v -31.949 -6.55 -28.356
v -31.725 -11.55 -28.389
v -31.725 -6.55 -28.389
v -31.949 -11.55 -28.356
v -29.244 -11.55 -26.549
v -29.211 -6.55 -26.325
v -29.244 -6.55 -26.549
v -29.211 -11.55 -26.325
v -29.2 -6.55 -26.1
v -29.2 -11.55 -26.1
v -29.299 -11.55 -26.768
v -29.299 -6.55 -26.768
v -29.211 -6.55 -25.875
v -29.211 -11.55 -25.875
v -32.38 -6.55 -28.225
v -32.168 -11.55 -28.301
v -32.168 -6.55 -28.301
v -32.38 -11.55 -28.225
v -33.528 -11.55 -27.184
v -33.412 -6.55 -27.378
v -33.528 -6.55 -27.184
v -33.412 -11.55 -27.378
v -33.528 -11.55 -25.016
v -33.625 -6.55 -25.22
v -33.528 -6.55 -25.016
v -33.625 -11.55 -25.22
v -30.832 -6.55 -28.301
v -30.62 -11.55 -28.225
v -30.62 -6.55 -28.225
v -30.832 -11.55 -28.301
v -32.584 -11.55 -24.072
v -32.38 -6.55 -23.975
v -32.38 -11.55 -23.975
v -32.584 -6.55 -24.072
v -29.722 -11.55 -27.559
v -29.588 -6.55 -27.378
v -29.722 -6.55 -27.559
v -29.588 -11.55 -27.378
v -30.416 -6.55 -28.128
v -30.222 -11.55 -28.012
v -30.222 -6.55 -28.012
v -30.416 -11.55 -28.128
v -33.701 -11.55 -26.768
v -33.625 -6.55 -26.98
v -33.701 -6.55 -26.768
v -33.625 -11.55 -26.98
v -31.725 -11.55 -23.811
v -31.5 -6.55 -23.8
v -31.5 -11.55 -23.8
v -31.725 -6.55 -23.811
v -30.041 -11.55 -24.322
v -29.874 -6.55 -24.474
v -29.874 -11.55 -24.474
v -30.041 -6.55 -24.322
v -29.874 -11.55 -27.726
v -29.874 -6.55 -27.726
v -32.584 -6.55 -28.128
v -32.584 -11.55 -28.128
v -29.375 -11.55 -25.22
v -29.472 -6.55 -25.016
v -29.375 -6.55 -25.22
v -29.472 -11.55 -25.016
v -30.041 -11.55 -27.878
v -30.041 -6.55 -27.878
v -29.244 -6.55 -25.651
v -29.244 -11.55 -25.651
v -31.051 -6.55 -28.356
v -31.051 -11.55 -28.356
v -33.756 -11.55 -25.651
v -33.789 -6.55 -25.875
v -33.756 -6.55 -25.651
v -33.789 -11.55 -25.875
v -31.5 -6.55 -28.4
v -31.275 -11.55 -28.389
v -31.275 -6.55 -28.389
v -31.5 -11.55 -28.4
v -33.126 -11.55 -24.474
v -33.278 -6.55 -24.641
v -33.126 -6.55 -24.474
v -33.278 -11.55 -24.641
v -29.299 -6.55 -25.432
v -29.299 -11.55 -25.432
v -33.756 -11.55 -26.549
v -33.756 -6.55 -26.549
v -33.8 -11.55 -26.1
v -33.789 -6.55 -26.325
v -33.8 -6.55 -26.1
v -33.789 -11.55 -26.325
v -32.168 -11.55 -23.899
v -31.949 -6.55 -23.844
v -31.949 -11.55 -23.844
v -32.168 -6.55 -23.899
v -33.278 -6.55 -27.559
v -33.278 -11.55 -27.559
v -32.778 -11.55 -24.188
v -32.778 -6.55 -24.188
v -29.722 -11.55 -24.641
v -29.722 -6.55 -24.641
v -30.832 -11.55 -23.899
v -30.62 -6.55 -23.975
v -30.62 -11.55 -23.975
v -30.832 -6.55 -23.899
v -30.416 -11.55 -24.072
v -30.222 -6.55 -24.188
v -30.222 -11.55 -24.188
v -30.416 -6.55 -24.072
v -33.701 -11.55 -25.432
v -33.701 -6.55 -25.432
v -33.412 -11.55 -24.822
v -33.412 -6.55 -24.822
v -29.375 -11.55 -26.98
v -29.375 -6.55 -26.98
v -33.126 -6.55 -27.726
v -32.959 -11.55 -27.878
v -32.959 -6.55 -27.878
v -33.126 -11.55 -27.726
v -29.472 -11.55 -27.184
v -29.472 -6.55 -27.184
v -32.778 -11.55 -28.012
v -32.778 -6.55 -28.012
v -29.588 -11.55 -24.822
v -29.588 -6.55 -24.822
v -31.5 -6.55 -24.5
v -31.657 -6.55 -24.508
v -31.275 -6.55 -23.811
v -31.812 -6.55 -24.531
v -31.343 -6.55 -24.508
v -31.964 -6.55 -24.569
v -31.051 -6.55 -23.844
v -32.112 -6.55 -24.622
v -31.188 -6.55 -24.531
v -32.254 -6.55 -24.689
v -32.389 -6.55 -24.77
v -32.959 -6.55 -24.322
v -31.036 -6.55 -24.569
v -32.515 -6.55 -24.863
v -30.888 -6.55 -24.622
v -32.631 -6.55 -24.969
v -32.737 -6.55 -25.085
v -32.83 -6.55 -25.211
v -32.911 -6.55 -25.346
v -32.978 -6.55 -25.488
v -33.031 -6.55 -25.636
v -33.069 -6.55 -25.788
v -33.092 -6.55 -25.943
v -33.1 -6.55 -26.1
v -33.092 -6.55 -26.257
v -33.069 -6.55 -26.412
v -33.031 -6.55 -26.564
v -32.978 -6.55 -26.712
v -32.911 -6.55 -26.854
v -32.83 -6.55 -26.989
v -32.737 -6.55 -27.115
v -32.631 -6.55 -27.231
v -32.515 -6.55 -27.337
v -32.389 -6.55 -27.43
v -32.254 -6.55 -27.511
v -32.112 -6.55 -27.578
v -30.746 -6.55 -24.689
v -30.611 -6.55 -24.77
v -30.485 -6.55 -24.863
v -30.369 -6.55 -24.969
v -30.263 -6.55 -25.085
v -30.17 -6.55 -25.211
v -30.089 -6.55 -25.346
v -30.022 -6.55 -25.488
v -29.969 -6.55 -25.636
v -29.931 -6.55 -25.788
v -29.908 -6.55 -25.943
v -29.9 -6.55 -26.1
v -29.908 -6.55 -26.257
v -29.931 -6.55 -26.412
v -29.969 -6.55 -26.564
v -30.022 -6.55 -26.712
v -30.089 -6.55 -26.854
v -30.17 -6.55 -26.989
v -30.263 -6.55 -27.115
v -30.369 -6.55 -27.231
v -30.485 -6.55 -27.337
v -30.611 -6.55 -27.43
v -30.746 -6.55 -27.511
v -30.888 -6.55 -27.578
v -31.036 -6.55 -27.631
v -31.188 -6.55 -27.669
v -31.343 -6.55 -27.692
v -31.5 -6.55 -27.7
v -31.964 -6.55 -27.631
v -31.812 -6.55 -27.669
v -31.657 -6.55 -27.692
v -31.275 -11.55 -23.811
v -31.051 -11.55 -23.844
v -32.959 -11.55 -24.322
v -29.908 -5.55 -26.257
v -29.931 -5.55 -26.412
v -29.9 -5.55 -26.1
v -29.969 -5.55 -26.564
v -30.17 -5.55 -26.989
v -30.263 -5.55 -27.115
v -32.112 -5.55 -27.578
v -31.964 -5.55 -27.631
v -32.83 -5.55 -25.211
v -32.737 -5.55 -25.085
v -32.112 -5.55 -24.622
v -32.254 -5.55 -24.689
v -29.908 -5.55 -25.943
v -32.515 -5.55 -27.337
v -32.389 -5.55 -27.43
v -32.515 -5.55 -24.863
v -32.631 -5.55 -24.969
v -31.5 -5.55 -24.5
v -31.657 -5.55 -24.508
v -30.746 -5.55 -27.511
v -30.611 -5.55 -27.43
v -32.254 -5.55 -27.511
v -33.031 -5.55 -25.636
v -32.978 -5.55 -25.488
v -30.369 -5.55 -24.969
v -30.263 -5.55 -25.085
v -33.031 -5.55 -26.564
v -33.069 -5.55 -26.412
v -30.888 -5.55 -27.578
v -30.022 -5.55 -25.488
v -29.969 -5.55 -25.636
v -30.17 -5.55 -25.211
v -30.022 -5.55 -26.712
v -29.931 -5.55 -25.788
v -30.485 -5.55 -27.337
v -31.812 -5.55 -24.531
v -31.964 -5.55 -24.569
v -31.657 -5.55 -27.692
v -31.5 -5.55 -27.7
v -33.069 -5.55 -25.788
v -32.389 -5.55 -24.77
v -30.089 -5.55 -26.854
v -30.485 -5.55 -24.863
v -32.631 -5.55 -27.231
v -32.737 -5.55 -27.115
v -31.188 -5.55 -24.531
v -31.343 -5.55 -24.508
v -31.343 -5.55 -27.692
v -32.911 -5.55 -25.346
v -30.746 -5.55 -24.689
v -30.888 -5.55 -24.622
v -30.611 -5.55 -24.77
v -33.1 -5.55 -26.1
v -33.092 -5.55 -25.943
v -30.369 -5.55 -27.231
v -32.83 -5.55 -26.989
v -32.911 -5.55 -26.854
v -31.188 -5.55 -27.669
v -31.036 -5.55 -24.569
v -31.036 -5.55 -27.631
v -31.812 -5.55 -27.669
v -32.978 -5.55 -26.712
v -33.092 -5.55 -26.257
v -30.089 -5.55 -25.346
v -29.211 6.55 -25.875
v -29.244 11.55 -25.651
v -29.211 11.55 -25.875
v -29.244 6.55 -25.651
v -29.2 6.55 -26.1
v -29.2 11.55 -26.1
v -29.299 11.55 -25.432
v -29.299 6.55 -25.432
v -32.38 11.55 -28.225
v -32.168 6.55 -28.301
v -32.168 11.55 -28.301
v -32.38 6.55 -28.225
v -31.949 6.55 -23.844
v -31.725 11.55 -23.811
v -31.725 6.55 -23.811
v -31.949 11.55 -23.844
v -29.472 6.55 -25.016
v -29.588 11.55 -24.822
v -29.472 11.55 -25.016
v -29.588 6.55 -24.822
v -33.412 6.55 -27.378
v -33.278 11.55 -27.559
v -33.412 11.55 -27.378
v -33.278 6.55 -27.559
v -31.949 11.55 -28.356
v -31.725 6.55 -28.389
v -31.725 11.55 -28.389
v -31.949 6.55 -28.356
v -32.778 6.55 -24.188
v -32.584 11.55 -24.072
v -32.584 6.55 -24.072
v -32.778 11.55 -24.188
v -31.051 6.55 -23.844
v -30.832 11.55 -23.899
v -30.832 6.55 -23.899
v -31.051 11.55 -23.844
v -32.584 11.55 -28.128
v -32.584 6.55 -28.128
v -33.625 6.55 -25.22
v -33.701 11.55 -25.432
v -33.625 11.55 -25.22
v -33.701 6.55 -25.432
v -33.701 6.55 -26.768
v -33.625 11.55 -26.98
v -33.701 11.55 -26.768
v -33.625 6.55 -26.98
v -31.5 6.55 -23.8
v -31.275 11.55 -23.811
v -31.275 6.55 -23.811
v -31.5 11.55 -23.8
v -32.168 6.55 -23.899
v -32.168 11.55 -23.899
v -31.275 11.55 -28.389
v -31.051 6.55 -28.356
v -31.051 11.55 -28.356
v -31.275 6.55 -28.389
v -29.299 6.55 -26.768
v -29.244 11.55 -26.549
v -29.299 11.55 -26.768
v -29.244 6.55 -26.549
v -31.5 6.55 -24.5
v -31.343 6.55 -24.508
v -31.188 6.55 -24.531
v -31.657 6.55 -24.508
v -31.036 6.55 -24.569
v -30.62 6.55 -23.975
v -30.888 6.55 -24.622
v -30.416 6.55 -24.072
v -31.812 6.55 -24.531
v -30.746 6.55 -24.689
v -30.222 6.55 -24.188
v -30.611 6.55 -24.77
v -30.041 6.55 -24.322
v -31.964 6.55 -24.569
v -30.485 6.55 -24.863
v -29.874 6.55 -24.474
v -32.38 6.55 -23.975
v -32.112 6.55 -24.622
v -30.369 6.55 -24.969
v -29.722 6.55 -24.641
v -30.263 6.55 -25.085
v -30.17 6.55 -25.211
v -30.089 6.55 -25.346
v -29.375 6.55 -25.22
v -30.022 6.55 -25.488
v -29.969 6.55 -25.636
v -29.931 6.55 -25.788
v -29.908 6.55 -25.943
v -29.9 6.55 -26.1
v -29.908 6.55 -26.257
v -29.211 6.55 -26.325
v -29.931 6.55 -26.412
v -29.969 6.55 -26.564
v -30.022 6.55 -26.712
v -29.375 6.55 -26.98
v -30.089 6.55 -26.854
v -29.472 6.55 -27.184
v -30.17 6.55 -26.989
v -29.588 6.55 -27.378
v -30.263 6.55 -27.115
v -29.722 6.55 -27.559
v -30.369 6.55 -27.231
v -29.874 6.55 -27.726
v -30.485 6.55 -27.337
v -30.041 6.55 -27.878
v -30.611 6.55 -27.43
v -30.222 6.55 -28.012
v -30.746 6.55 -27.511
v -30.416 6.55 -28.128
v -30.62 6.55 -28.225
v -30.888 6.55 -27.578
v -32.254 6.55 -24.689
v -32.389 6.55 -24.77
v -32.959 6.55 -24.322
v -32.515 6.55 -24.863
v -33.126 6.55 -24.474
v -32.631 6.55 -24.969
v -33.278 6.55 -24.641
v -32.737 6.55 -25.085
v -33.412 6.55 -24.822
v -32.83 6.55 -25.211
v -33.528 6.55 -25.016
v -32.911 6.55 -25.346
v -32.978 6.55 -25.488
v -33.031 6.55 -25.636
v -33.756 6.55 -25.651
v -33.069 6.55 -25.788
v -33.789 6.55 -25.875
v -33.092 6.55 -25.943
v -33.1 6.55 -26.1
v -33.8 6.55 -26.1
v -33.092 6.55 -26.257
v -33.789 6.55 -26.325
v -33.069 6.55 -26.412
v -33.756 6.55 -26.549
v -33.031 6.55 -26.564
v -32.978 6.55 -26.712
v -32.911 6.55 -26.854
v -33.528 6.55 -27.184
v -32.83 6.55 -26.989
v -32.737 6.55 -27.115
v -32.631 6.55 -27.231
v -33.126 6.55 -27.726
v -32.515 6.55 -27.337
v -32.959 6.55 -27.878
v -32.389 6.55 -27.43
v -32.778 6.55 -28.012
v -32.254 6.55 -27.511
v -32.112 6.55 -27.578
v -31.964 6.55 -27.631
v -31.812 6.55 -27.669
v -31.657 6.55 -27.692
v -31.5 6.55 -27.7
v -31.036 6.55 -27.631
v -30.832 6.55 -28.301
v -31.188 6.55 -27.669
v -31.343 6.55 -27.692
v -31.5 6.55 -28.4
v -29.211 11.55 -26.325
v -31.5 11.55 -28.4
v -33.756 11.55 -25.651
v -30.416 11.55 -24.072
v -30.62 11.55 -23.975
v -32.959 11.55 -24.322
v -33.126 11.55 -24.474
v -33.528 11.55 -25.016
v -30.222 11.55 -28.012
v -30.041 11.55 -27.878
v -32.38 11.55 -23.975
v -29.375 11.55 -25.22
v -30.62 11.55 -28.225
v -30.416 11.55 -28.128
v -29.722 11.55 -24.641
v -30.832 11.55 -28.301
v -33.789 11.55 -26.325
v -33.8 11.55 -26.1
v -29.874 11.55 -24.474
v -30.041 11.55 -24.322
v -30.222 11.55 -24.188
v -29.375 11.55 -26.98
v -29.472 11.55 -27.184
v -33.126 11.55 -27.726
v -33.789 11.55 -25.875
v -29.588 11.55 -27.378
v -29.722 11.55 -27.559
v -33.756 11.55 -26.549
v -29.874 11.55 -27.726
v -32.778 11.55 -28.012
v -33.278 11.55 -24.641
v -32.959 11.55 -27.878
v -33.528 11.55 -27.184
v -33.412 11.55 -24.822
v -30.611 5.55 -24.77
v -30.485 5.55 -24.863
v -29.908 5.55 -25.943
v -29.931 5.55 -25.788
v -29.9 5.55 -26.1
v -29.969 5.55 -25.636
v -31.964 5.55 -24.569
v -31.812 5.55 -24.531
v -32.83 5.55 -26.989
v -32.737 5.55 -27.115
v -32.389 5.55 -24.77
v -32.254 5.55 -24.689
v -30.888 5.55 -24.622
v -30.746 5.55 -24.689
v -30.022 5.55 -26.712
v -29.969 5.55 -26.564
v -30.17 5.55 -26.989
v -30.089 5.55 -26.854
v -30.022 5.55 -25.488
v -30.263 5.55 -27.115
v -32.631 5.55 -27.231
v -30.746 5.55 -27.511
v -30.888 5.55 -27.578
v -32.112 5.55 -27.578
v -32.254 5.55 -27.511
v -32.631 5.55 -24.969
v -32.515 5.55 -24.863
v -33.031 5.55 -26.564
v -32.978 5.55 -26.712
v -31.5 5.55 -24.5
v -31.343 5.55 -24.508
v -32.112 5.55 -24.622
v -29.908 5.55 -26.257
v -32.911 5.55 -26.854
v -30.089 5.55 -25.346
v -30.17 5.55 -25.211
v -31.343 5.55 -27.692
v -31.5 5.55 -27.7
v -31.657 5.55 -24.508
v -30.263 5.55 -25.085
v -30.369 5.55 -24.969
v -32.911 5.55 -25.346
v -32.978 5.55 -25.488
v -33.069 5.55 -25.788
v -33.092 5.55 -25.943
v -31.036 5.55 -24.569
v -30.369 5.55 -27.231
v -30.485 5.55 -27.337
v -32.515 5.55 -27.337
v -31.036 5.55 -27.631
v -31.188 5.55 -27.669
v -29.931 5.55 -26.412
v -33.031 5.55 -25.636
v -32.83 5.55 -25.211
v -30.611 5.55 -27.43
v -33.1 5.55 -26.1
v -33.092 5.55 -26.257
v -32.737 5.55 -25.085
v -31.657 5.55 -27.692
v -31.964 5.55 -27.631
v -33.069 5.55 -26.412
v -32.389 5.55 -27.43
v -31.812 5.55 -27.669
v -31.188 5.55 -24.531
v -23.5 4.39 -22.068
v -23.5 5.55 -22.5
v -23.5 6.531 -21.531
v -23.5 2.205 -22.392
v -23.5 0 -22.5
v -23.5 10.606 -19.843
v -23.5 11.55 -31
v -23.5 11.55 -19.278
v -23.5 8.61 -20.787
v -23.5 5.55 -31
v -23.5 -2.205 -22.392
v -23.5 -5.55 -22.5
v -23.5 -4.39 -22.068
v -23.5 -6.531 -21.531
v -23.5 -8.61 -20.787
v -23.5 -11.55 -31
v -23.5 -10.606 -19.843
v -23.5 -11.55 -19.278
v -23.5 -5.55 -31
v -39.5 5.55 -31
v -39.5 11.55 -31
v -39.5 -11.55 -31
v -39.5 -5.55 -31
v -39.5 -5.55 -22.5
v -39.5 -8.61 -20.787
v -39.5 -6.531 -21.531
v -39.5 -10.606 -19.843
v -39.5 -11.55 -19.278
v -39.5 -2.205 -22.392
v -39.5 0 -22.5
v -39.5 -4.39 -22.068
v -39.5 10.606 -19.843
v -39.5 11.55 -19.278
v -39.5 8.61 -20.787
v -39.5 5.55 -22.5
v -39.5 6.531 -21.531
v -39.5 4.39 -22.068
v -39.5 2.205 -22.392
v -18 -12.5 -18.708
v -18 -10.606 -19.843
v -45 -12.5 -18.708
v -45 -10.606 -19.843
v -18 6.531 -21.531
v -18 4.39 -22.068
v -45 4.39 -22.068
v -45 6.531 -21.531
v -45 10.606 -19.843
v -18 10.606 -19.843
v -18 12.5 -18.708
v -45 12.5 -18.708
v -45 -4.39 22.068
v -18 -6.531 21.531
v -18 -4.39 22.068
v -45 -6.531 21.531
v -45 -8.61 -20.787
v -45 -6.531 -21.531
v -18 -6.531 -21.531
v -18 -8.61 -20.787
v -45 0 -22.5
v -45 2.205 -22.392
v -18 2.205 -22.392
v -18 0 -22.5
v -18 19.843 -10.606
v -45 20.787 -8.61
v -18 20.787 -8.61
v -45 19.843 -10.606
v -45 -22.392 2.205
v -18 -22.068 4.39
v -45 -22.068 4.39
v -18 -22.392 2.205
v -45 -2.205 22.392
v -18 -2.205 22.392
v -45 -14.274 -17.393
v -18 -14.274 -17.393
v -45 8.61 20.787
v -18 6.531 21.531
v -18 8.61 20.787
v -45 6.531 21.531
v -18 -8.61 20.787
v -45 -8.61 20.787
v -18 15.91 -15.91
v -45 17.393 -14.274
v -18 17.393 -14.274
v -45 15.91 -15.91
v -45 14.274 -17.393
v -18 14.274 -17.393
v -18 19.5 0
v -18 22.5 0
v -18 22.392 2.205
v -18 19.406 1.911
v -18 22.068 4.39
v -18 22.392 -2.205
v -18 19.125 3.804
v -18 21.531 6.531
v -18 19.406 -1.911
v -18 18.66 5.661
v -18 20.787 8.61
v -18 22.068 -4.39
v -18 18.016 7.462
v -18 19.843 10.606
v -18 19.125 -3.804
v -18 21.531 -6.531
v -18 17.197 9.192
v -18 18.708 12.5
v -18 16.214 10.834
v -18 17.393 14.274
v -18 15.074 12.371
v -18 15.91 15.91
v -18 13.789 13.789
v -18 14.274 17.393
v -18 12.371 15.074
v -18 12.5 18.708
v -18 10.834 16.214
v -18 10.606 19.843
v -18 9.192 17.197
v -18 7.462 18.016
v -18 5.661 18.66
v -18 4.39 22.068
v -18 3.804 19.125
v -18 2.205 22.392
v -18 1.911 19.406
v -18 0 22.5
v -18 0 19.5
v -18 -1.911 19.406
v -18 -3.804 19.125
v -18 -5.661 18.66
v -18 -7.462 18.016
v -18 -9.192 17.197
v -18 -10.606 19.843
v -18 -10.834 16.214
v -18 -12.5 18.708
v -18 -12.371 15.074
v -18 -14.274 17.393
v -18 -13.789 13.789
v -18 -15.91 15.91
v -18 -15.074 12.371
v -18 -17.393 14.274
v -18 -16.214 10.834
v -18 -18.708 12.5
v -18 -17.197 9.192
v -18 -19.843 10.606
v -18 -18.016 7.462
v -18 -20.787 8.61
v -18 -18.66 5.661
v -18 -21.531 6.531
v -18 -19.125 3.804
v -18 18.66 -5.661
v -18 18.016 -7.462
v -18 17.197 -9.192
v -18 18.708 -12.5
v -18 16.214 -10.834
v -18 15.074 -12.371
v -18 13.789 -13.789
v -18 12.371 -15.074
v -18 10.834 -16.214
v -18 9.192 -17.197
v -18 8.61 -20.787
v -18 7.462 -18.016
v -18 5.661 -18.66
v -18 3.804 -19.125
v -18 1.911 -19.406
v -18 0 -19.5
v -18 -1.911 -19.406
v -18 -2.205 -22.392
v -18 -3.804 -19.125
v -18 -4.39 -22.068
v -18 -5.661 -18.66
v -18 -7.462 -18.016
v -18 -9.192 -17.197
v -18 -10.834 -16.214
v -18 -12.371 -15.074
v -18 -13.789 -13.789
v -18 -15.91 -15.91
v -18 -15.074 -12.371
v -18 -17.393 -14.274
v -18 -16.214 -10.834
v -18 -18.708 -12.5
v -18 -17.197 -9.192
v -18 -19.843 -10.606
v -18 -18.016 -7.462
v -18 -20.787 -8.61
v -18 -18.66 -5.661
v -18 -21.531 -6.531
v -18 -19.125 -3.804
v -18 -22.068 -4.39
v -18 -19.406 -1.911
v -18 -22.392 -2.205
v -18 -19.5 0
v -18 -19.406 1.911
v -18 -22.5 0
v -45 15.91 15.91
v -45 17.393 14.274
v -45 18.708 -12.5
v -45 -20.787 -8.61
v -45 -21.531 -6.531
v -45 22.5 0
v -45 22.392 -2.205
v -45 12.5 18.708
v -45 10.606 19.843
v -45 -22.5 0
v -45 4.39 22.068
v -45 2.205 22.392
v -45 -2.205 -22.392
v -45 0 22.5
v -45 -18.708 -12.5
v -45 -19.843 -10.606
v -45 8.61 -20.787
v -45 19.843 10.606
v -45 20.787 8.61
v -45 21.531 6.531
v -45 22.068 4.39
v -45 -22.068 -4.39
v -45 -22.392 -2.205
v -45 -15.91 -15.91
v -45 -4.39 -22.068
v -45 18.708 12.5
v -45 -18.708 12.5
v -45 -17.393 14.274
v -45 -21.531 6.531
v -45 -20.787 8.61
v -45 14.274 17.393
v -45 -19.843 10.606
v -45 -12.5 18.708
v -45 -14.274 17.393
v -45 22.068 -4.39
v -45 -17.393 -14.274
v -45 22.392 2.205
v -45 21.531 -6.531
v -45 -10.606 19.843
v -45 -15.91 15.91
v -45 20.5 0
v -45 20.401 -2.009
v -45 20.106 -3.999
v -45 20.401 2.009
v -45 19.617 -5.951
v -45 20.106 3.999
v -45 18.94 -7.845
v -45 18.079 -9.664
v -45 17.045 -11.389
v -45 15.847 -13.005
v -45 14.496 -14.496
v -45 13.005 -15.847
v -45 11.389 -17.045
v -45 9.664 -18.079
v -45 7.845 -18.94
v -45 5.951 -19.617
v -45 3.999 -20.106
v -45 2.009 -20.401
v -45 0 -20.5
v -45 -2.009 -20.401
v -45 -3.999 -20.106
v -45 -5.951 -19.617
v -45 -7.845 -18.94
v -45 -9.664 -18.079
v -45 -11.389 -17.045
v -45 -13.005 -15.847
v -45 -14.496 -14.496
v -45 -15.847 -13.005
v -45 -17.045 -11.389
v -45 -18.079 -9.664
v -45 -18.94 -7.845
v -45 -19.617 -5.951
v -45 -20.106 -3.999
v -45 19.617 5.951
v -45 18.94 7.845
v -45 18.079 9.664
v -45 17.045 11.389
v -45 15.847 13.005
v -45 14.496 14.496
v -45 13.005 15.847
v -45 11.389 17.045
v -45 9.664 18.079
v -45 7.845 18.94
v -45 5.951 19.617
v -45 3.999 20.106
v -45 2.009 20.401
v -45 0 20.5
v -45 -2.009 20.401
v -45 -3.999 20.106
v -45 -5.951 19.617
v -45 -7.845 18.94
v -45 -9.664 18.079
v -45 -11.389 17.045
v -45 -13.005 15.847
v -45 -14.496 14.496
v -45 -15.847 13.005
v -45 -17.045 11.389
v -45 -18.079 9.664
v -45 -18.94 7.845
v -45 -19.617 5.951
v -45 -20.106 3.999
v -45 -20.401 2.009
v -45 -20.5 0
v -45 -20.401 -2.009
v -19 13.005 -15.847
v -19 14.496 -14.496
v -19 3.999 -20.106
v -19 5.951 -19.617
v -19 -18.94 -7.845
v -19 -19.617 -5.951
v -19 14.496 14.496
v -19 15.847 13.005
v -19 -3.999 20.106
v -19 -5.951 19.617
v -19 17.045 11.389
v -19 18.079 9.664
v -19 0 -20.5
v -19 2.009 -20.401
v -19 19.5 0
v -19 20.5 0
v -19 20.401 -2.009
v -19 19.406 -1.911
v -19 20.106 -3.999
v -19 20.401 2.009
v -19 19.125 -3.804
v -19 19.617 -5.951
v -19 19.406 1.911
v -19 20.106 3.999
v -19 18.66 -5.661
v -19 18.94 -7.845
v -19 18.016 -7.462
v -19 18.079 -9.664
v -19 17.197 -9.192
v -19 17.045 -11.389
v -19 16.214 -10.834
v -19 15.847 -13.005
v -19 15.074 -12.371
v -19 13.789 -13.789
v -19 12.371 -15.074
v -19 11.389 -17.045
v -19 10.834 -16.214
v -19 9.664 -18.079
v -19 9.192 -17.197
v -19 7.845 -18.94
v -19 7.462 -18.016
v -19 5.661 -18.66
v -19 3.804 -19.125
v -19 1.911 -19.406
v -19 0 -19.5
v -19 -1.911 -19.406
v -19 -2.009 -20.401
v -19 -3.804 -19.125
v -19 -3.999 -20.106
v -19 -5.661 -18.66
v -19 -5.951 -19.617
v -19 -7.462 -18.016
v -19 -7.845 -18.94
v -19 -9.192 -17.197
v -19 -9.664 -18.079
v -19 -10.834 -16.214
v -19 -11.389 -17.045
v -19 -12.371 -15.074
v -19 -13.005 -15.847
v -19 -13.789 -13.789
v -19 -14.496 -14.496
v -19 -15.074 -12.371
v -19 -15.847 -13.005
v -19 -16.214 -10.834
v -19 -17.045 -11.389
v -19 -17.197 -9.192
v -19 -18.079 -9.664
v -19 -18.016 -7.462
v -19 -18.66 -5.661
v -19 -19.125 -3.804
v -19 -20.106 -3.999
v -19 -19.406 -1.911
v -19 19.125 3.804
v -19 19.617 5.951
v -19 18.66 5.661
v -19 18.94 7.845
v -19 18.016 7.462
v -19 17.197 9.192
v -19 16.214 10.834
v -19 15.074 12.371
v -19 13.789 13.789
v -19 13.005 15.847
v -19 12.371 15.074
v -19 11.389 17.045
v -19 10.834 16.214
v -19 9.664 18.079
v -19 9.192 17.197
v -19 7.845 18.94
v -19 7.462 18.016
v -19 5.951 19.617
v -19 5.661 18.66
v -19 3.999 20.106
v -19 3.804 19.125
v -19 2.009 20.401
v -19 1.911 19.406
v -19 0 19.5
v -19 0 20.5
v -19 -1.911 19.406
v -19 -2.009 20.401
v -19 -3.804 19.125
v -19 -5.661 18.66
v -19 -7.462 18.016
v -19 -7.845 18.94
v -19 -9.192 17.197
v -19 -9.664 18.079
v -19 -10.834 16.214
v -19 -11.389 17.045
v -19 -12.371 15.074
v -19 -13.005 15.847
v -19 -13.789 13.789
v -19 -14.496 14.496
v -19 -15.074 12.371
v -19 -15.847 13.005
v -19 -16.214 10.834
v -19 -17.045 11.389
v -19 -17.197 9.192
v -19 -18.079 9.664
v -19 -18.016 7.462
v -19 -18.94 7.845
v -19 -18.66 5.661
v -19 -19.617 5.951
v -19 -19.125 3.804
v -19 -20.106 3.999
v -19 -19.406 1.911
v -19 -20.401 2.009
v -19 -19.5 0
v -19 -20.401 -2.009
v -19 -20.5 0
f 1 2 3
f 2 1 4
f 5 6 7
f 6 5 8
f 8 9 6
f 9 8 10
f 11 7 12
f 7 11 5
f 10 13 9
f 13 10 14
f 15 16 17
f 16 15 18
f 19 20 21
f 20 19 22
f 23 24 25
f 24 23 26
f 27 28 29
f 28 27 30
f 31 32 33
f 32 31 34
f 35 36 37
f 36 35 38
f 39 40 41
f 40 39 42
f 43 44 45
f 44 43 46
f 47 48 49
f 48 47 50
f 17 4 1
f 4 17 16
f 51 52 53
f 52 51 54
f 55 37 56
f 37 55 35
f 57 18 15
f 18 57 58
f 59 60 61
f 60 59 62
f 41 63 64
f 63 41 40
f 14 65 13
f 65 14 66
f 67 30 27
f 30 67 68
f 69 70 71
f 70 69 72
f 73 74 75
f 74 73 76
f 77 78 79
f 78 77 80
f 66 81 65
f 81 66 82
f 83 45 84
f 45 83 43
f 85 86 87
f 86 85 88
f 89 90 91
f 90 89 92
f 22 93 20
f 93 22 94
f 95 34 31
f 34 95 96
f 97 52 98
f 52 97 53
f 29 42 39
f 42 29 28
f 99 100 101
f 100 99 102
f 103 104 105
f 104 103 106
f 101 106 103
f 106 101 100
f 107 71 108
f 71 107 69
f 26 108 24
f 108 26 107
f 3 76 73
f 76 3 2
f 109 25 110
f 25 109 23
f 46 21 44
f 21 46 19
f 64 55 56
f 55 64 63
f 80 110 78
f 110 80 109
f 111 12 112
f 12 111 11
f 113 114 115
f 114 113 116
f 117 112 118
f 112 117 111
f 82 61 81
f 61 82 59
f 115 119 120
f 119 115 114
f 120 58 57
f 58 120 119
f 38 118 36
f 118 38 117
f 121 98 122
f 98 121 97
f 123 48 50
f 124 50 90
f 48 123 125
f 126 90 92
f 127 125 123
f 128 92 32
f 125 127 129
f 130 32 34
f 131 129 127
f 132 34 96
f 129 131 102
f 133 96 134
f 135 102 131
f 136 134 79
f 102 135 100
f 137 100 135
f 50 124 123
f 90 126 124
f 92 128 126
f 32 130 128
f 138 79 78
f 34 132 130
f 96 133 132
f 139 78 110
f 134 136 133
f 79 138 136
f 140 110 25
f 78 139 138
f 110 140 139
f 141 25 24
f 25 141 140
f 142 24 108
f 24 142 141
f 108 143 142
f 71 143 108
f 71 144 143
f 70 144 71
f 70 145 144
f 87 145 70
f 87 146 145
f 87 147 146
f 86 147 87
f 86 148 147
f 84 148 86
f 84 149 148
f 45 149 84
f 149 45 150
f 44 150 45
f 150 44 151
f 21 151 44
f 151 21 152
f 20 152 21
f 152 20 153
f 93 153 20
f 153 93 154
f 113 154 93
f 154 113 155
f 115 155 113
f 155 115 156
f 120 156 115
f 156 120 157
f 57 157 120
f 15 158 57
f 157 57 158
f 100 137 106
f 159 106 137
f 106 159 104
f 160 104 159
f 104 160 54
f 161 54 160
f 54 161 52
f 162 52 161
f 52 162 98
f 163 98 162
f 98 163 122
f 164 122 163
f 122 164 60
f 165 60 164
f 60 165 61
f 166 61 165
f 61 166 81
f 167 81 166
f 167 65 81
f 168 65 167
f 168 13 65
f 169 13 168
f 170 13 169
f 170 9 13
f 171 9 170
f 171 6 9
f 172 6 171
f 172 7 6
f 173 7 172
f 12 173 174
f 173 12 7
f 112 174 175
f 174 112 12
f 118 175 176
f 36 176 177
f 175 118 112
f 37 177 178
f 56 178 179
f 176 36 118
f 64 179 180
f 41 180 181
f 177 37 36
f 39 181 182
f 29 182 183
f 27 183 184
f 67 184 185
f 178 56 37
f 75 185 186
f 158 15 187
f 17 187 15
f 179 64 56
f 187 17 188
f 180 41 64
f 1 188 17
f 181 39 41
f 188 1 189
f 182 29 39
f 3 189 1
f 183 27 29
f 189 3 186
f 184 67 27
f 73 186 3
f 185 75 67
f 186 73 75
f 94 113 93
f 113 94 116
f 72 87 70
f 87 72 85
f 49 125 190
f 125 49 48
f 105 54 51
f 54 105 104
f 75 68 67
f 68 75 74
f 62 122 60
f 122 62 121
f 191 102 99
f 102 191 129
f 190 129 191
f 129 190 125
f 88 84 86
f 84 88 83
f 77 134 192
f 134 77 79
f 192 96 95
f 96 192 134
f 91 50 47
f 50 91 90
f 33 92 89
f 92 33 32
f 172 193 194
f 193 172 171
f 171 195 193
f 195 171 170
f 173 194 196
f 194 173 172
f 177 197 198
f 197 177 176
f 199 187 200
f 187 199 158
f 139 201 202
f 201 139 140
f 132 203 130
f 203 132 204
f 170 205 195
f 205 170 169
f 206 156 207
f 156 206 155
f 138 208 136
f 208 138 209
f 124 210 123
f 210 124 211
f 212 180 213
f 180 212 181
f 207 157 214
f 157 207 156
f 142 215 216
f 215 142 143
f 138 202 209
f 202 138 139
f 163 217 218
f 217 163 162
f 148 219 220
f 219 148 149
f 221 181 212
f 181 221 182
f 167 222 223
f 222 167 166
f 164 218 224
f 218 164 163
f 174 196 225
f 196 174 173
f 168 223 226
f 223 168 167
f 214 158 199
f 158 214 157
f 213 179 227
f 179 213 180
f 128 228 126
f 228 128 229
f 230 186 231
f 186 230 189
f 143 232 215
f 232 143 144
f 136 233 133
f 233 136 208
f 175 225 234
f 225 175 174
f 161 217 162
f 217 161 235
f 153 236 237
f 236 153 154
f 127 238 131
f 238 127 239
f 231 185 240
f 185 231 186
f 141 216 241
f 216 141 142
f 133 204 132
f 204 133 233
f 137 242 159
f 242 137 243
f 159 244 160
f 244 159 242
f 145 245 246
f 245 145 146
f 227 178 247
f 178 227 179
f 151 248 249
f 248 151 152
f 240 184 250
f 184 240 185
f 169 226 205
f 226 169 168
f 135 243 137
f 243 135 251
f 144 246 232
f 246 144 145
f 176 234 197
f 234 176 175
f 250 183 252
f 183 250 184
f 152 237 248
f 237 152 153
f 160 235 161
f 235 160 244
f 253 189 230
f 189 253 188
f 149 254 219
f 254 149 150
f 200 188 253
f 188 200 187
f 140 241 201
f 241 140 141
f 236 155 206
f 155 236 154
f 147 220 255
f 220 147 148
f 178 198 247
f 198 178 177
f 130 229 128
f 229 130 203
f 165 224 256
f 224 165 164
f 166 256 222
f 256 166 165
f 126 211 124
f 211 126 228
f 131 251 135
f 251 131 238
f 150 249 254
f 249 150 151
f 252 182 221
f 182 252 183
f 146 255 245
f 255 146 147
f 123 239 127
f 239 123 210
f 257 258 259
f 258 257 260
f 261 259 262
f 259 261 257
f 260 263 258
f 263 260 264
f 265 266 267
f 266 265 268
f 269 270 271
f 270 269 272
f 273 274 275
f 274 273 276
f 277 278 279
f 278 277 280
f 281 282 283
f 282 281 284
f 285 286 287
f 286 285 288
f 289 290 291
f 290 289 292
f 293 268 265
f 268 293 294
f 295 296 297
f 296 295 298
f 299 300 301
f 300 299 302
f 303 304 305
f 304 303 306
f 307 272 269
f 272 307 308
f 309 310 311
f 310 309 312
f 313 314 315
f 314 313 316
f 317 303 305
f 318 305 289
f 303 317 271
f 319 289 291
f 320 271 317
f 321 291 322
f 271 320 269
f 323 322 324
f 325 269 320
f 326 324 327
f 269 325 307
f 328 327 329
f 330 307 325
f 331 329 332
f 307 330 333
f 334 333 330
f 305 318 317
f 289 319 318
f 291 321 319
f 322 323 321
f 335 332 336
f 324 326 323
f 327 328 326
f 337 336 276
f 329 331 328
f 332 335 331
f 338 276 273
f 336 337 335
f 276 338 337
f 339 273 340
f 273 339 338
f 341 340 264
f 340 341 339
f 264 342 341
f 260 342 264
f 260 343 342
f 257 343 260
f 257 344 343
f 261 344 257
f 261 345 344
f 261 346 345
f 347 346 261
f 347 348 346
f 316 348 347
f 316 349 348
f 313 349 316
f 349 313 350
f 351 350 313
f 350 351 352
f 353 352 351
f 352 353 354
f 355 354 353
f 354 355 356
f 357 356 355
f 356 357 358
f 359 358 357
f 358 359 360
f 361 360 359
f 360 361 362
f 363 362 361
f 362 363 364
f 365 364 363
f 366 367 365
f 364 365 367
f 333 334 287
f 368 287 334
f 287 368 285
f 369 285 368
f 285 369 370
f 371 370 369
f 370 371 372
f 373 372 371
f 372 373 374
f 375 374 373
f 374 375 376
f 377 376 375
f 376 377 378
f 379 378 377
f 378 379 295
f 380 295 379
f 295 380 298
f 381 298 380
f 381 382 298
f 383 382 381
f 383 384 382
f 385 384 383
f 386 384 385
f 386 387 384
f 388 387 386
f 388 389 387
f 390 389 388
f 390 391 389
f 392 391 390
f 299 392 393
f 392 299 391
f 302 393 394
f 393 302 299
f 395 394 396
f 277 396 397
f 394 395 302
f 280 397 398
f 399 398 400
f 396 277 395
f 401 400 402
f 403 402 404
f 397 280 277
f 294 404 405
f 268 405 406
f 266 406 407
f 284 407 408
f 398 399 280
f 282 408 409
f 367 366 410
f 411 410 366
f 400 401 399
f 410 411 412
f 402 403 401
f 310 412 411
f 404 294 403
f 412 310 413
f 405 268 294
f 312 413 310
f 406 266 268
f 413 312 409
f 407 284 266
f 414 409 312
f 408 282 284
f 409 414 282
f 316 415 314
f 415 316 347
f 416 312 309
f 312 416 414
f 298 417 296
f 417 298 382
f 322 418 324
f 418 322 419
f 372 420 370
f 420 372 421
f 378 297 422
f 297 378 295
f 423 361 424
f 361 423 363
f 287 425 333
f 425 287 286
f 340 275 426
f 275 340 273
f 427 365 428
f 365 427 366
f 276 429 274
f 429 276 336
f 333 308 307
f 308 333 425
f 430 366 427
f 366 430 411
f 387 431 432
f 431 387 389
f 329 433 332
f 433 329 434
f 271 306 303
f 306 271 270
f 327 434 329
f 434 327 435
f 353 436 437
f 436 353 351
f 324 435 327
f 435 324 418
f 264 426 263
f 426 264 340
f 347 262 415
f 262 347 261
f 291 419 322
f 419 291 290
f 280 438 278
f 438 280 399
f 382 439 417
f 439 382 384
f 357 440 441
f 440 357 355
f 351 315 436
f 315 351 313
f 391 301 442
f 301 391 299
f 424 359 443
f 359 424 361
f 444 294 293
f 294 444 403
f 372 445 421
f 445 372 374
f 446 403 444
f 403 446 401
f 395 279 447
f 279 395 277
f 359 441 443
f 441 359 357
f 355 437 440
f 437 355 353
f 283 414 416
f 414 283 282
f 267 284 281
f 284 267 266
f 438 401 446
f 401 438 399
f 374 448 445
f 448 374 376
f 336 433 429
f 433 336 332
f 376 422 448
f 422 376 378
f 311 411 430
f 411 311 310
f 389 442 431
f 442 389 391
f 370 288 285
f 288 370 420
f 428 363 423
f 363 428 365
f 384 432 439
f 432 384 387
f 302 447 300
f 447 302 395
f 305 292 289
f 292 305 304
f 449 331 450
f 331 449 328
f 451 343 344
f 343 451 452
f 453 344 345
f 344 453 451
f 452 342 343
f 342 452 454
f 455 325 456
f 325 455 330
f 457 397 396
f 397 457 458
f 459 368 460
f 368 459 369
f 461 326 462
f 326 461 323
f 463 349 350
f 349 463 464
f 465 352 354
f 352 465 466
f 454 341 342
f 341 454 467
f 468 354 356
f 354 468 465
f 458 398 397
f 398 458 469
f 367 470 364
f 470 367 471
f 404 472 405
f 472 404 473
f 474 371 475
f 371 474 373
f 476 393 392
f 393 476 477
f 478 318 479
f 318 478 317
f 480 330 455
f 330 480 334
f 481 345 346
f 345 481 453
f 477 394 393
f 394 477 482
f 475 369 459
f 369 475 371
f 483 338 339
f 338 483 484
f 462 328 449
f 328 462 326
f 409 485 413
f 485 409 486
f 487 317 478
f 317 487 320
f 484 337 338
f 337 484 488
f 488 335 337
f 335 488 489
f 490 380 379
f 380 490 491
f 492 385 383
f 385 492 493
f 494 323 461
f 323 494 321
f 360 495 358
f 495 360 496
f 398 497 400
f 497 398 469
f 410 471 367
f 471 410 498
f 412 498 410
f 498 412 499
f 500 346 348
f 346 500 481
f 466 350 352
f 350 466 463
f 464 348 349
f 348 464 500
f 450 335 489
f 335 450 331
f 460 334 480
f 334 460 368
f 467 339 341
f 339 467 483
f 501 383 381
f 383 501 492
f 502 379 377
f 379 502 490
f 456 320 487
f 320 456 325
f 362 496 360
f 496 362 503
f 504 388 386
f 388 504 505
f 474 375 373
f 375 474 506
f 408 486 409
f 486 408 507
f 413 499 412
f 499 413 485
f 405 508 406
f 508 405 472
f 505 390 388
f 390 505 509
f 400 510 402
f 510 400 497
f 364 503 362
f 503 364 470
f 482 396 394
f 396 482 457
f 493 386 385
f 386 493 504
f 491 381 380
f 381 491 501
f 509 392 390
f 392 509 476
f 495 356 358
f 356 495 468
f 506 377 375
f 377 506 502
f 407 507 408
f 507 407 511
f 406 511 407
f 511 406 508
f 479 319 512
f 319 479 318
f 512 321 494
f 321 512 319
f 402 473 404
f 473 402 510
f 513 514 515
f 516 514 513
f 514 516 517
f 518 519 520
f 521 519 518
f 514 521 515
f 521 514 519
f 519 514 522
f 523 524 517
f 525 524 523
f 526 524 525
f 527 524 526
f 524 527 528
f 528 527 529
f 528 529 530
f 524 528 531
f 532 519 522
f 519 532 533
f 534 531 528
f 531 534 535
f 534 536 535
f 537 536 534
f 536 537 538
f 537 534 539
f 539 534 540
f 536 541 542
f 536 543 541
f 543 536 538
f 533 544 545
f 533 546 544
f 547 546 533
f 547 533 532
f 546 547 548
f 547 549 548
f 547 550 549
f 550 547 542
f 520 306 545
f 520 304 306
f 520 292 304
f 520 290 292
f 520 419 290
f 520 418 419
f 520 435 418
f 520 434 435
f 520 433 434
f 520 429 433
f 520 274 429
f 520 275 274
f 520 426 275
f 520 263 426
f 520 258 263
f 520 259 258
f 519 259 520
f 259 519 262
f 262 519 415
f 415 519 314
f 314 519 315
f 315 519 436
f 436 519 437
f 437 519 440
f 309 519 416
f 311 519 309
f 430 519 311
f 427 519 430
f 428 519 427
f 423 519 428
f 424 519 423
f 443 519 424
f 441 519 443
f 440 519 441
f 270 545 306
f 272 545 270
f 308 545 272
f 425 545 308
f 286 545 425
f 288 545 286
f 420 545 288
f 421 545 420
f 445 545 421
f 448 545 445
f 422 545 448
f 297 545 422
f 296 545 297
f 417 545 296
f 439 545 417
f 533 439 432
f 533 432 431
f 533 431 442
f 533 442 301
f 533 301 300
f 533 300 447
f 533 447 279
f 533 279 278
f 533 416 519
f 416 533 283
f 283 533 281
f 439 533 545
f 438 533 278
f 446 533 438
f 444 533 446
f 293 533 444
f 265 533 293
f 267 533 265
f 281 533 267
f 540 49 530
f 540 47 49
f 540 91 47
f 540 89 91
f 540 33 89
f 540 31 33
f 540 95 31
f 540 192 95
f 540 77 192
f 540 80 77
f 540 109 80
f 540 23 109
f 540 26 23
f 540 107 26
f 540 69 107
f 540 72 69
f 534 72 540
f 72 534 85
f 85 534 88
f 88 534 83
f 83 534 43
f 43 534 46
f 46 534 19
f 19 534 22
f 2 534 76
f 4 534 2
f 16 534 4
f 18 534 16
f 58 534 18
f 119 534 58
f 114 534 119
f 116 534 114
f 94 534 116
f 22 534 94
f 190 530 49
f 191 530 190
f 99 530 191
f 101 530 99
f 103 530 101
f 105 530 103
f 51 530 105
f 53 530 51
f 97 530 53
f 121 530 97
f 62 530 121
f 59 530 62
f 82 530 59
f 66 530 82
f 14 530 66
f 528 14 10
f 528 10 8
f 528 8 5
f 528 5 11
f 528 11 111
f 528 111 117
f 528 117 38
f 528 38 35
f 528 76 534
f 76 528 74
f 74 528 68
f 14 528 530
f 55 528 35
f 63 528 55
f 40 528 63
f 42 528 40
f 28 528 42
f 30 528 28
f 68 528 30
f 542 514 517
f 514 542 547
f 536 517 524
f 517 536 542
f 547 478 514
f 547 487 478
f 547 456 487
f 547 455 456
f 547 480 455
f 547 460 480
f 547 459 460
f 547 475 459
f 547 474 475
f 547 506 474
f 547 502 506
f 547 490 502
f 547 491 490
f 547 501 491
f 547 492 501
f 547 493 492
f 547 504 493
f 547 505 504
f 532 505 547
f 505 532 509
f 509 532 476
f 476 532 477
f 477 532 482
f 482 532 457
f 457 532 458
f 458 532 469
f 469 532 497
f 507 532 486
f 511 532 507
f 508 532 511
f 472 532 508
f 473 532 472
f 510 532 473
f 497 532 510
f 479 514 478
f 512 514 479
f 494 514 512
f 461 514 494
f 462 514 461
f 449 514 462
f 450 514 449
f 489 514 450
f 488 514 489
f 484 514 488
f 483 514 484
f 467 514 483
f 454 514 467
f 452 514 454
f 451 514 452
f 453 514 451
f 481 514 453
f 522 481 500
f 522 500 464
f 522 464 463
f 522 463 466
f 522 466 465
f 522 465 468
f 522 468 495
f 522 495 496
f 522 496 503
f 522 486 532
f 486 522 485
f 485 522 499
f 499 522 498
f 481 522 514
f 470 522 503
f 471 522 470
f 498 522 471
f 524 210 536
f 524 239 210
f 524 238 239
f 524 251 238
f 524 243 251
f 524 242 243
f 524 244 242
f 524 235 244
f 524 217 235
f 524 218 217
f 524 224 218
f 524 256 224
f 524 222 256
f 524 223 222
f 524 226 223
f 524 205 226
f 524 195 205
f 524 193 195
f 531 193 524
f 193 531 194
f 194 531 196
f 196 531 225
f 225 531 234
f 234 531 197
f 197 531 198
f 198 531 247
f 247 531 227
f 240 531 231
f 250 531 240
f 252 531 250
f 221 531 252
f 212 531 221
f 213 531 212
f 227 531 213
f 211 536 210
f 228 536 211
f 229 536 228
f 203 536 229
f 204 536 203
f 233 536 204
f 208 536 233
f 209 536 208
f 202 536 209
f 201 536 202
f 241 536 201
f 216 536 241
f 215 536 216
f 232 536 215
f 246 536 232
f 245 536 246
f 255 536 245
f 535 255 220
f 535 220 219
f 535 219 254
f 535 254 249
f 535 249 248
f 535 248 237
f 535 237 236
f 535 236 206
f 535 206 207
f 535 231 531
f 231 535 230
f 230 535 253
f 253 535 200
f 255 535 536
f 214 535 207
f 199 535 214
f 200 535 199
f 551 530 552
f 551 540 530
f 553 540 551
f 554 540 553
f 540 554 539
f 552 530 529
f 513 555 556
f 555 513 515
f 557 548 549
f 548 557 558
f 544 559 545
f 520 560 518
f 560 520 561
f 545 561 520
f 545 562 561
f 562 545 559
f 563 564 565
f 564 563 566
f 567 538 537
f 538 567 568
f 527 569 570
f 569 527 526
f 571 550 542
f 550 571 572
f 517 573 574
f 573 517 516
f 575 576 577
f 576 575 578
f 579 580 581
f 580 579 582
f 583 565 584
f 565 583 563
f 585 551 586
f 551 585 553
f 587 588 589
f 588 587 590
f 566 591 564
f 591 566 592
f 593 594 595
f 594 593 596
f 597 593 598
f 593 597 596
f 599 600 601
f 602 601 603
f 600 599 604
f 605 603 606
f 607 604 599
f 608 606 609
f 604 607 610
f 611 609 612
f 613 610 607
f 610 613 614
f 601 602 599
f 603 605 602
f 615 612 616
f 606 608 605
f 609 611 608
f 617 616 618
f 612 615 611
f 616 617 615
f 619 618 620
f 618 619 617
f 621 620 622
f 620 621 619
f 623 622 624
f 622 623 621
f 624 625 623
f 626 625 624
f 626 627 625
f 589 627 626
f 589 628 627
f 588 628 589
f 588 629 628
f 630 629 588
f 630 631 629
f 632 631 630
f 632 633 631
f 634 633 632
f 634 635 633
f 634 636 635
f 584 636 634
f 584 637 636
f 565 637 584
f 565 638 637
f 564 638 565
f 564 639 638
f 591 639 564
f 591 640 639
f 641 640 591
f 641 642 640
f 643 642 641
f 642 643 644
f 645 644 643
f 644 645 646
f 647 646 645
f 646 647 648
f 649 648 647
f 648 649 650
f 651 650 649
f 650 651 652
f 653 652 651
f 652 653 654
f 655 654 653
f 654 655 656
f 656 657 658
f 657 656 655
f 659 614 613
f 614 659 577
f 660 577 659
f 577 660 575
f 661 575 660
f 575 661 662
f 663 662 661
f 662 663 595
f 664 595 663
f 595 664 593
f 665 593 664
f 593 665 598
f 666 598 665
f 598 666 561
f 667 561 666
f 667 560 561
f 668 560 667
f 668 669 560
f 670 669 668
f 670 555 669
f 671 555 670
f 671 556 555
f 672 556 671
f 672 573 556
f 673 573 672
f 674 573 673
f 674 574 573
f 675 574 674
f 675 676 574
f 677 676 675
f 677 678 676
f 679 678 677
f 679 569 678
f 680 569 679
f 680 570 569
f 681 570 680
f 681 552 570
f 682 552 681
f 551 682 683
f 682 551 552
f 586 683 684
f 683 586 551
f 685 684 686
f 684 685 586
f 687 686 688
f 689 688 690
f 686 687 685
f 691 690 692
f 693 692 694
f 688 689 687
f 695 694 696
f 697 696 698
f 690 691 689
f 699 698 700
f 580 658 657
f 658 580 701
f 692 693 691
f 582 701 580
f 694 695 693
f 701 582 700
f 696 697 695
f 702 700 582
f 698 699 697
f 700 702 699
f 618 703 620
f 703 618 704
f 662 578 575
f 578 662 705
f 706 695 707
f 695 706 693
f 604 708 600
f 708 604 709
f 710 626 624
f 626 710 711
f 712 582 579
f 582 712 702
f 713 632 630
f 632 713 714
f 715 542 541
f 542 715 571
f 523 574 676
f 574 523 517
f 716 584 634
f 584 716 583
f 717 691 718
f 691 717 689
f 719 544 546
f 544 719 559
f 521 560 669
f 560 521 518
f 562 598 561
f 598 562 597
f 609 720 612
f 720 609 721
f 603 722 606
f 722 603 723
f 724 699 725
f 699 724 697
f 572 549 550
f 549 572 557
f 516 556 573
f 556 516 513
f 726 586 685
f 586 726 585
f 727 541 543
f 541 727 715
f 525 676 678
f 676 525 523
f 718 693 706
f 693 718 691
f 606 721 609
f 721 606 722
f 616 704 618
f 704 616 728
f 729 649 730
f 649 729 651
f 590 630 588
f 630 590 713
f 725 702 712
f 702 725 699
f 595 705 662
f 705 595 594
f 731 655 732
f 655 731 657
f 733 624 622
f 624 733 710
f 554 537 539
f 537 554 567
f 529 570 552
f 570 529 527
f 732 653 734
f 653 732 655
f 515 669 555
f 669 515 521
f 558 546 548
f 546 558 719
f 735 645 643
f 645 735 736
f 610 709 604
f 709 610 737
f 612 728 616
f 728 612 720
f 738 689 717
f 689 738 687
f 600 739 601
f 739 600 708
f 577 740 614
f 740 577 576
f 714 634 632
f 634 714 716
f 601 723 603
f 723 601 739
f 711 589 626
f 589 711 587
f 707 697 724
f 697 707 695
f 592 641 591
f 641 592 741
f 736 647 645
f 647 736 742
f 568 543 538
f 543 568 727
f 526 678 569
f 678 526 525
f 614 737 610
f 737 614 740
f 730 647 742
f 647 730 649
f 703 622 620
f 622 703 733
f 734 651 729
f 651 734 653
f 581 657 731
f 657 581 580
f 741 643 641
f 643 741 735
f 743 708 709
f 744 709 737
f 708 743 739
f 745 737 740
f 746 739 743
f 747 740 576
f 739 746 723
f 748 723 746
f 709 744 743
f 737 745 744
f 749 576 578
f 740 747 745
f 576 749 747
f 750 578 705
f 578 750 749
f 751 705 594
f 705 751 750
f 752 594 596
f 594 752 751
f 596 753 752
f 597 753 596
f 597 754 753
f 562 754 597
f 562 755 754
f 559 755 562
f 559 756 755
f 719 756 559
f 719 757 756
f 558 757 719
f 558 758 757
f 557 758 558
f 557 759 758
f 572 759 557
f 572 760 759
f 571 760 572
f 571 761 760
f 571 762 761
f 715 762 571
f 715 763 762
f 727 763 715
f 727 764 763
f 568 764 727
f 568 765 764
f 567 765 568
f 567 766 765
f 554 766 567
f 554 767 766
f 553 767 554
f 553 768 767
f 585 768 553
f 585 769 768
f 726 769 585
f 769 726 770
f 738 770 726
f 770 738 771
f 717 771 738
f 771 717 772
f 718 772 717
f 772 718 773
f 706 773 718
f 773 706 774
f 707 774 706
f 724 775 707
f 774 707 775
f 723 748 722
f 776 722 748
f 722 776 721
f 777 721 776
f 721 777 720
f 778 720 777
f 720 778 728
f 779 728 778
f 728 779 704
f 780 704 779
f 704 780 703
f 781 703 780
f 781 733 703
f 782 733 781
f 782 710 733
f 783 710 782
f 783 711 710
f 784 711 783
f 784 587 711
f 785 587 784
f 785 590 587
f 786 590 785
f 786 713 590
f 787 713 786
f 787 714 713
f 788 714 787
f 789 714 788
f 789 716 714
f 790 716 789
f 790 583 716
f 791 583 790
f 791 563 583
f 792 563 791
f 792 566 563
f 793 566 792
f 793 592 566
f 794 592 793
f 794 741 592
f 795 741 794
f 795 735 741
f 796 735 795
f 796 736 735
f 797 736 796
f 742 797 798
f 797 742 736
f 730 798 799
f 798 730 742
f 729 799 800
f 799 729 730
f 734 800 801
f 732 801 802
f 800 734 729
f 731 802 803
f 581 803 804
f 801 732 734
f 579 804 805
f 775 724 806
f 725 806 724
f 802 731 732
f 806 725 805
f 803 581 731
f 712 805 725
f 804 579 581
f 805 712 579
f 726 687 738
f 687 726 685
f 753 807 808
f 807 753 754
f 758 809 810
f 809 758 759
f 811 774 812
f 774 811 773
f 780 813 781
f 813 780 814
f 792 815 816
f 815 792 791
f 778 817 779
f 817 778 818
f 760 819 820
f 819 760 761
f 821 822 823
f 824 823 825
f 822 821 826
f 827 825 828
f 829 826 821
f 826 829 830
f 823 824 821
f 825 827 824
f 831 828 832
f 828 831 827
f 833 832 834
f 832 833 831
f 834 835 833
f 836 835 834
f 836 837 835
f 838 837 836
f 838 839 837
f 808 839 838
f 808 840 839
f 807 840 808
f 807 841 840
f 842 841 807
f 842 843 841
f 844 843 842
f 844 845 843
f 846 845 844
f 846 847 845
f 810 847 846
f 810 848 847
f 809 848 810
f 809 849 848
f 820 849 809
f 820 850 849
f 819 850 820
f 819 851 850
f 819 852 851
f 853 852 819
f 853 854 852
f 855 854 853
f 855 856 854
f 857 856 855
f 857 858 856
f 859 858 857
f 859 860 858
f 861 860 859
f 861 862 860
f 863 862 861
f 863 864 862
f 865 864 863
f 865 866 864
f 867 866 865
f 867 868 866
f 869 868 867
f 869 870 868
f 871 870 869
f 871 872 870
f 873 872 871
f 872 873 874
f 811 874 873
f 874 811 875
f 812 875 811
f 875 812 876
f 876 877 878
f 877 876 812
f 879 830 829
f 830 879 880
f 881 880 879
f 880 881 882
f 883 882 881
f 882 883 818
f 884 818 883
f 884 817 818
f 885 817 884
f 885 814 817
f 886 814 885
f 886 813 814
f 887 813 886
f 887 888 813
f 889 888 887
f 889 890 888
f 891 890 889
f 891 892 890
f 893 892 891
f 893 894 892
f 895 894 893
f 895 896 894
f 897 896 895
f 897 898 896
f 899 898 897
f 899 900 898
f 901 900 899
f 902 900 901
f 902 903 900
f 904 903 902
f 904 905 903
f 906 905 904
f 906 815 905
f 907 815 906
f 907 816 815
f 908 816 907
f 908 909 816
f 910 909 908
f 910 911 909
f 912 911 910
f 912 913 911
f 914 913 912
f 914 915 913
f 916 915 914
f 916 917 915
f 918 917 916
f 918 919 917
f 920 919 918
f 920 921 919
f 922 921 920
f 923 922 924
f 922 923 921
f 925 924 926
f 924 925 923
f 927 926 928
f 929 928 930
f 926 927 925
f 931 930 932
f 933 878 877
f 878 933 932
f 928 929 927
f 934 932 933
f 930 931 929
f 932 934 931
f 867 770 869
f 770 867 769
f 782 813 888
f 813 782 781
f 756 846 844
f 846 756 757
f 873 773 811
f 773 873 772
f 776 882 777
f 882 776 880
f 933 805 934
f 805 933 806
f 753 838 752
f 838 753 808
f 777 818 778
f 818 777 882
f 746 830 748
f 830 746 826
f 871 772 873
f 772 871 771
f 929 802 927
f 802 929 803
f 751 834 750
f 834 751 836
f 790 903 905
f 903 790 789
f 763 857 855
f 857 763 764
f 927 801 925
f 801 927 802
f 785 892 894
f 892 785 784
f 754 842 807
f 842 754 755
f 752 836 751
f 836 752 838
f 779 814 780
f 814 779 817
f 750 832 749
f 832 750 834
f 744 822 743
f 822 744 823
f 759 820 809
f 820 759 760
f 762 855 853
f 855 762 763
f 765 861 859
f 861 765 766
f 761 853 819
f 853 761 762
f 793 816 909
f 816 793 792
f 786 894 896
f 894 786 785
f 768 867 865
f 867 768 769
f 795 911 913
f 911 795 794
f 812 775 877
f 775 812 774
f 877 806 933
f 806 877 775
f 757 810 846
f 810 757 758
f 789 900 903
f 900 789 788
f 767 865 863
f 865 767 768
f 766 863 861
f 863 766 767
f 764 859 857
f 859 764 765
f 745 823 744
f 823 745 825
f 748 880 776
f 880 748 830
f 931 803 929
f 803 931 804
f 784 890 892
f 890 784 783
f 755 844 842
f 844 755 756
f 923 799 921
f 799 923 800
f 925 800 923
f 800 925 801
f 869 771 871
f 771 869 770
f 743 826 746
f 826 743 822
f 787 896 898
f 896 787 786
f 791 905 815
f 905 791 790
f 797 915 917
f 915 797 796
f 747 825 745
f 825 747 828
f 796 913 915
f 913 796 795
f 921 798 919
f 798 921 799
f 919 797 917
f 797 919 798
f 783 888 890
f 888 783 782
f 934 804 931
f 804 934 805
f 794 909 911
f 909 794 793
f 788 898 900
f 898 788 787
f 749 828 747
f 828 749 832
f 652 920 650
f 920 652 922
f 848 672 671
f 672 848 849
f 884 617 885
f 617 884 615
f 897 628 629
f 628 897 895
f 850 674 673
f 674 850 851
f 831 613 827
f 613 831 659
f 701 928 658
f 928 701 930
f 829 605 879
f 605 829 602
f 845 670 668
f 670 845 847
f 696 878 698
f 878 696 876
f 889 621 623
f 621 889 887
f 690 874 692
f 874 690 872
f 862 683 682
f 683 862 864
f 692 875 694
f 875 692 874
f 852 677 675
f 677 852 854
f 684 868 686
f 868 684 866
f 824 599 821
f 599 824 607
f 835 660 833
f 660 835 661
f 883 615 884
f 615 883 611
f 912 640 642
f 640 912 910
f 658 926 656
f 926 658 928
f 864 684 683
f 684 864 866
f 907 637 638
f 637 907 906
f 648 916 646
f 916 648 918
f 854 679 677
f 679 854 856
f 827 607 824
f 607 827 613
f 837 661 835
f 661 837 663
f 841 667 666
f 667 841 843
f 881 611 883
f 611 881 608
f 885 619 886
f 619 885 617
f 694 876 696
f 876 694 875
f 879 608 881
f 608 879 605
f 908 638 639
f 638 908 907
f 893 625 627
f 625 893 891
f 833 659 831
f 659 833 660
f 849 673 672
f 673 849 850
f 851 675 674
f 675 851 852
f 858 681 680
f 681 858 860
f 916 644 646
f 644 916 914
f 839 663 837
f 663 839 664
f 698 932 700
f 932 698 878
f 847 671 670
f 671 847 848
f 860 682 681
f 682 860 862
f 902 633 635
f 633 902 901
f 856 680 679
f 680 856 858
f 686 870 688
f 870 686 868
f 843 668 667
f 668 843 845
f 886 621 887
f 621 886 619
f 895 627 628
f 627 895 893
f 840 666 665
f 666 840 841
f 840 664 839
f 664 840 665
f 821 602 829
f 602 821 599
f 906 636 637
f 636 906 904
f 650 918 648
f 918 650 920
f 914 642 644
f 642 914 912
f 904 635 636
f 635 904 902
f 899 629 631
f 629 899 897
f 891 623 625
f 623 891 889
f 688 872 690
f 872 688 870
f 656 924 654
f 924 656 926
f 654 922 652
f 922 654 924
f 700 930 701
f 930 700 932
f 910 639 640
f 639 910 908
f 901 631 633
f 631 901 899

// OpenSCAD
skip_main_render = true;
include <../../optical_setup.scad>

lens_sleeve_slider();
